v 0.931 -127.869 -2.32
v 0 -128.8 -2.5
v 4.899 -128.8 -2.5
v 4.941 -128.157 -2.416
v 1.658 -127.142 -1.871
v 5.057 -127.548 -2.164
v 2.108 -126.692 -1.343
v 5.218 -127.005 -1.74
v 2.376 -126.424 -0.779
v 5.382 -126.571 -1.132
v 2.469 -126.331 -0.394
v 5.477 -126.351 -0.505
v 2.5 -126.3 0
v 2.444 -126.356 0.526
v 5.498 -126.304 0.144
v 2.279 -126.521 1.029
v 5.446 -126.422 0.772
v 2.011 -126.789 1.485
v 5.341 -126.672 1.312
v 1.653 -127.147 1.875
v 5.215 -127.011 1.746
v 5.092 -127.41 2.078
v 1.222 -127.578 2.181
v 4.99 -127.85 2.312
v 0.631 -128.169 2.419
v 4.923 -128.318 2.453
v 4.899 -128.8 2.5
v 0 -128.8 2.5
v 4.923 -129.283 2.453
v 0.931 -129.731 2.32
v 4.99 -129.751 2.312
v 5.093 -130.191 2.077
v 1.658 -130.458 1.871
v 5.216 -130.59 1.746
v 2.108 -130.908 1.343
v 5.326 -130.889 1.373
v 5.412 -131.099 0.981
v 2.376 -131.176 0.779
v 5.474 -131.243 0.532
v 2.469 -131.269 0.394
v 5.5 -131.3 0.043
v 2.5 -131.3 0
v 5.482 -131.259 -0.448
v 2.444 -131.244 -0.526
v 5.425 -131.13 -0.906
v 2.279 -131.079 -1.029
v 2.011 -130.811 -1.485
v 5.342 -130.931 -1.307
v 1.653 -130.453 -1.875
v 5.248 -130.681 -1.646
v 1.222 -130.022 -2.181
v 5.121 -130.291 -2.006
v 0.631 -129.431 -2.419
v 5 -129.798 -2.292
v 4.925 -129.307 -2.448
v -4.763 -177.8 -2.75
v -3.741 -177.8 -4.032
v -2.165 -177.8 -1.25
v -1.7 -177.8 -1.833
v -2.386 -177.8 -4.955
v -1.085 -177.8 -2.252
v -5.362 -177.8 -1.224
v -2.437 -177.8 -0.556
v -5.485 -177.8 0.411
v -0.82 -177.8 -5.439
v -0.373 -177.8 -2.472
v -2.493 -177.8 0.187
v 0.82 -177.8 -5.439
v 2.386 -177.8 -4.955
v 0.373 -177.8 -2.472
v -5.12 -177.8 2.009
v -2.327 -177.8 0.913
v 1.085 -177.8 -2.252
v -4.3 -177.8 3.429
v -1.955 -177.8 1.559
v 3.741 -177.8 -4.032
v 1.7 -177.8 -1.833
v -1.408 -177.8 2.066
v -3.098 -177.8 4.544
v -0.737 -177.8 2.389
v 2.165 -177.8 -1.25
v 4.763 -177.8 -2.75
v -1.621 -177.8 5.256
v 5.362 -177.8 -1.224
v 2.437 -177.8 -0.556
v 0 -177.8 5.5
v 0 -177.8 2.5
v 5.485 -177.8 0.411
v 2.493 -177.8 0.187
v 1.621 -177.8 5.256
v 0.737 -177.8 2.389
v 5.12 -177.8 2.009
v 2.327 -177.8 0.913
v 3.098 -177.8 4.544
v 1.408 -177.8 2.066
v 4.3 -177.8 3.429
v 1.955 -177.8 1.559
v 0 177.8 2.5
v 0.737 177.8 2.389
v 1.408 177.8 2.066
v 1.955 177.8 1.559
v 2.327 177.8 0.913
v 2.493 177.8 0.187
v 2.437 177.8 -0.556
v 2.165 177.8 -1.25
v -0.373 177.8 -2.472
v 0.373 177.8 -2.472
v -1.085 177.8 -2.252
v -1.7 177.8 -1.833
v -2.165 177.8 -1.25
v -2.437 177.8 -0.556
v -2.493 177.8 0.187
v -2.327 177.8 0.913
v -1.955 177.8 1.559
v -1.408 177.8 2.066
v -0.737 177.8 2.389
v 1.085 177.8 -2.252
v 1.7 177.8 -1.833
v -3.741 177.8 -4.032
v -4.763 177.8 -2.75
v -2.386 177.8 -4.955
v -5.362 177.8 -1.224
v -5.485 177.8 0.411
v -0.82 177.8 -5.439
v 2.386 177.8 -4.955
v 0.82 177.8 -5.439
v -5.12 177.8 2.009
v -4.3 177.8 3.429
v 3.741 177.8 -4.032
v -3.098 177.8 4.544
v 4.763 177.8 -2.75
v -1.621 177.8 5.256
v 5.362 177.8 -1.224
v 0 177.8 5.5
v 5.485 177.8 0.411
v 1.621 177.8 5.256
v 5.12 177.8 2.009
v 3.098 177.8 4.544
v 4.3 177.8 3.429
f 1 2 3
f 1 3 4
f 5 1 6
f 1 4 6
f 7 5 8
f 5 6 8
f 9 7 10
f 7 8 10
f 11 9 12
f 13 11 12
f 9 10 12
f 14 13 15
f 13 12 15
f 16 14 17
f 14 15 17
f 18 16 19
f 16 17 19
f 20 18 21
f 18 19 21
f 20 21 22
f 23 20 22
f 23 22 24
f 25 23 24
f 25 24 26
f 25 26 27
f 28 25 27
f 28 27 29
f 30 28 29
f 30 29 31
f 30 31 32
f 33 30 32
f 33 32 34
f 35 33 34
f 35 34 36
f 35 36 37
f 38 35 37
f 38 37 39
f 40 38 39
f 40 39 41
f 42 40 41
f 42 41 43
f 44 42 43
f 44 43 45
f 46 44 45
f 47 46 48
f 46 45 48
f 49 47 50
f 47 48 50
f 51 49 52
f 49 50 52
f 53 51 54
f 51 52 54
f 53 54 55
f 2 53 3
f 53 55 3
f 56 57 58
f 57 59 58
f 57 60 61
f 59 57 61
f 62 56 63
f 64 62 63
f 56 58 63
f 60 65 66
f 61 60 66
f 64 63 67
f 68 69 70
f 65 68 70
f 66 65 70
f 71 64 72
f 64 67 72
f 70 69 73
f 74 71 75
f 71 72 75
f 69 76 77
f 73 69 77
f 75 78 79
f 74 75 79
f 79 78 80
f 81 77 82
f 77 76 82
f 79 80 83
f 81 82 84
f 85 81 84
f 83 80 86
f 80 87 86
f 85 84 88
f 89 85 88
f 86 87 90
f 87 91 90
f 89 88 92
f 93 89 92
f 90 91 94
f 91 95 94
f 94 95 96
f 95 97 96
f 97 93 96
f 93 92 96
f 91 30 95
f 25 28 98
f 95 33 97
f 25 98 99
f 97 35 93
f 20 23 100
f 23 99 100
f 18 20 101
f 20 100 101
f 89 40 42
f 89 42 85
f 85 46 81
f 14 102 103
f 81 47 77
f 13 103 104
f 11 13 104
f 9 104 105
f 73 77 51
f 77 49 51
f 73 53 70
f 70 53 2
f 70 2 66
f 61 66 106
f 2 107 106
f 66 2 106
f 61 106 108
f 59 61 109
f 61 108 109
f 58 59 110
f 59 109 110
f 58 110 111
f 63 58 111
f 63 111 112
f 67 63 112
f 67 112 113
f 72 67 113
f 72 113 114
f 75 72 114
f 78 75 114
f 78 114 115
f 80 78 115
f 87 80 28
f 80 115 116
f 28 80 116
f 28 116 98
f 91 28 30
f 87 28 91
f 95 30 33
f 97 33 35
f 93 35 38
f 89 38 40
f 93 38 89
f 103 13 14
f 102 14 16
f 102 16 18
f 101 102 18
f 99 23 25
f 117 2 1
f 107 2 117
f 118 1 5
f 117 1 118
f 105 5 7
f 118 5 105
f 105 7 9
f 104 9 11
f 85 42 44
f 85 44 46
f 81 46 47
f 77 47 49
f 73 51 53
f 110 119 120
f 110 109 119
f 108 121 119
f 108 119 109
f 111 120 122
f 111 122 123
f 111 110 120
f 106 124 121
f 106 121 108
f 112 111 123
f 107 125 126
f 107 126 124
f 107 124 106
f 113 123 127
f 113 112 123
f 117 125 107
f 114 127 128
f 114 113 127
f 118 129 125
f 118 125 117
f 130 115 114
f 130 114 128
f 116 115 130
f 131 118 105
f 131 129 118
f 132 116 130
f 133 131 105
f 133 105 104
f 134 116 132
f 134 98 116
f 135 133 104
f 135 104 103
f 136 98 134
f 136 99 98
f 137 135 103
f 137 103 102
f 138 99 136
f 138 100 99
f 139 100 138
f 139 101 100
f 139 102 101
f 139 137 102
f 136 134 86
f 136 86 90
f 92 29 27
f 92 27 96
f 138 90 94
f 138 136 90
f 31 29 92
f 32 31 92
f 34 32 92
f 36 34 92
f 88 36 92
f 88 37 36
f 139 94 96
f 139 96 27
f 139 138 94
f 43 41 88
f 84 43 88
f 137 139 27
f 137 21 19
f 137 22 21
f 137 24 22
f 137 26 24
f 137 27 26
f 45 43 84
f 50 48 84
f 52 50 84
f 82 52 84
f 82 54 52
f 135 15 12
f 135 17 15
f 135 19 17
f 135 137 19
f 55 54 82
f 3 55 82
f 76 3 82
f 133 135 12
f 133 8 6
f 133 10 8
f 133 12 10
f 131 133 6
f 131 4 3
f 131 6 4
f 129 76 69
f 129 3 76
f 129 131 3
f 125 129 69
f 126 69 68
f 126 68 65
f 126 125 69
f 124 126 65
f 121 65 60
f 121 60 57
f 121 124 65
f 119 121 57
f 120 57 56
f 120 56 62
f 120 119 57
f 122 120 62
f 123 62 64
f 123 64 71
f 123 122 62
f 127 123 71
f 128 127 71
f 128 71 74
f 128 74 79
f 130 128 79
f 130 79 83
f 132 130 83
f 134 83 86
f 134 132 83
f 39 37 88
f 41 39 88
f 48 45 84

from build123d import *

# Parameters (mm, degrees)
SKETCH1_R               = 5.5
BOSS_EXTRUDE2_DEPTH     = 177.8
SKETCH4_R               = 2.5
CUT_EXTRUDE1_DEPTH      = 356.685057319
CUT_EXTRUDE3_REACH      = 180.559
CUT_EXTRUDE3_END_RADIUS = 2.5
SKETCH7_R               = 2.5


with BuildPart() as part:
    # Sketch1 → Boss-Extrude2 (new, symmetric)
    with BuildSketch(Plane(origin=(0, 0, 0), x_dir=(1, 0, 0), z_dir=(0, 1, 0))):
        with Locations(Location((0, 0, 0), (0, 0, 270))):
            Circle(SKETCH1_R)
    extrude(amount=BOSS_EXTRUDE2_DEPTH, both=True)

    # Sketch4 → Cut-Extrude1 (cut, through all)
    with BuildSketch(Plane(origin=(0, 177.8, 0), x_dir=(1, 0, 0), z_dir=(0, 1, 0))):
        with Locations(Location((0, 0, 0), (0, 0, 270))):
            Circle(SKETCH4_R)
    extrude(amount=-CUT_EXTRUDE1_DEPTH, mode=Mode.SUBTRACT)

    # Cut-Extrude3: up to this cylinder (the profile starts outside it)
    cut_extrude3_end = Plane(origin=(0, -128.8, 0), z_dir=(0, 1, 0)) * Cylinder(CUT_EXTRUDE3_END_RADIUS, 367.118, mode=Mode.PRIVATE)
    # Sketch7 → Cut-Extrude3 (cut, up to the surface)
    with BuildSketch(Plane(origin=(10, 0, 0), x_dir=(0, 0, -1), z_dir=(1, 0, 0)), mode=Mode.PRIVATE) as cut_extrude3_sk1:
        with Locations((0, -128.8)):
            Circle(SKETCH7_R)
    cut_extrude3_tool1 = extrude(cut_extrude3_sk1.sketch, amount=-CUT_EXTRUDE3_REACH, mode=Mode.PRIVATE) - cut_extrude3_end
    add(cut_extrude3_tool1.solids().sort_by_distance((10, -128.8, 0))[0], mode=Mode.SUBTRACT)


solid = part.part
